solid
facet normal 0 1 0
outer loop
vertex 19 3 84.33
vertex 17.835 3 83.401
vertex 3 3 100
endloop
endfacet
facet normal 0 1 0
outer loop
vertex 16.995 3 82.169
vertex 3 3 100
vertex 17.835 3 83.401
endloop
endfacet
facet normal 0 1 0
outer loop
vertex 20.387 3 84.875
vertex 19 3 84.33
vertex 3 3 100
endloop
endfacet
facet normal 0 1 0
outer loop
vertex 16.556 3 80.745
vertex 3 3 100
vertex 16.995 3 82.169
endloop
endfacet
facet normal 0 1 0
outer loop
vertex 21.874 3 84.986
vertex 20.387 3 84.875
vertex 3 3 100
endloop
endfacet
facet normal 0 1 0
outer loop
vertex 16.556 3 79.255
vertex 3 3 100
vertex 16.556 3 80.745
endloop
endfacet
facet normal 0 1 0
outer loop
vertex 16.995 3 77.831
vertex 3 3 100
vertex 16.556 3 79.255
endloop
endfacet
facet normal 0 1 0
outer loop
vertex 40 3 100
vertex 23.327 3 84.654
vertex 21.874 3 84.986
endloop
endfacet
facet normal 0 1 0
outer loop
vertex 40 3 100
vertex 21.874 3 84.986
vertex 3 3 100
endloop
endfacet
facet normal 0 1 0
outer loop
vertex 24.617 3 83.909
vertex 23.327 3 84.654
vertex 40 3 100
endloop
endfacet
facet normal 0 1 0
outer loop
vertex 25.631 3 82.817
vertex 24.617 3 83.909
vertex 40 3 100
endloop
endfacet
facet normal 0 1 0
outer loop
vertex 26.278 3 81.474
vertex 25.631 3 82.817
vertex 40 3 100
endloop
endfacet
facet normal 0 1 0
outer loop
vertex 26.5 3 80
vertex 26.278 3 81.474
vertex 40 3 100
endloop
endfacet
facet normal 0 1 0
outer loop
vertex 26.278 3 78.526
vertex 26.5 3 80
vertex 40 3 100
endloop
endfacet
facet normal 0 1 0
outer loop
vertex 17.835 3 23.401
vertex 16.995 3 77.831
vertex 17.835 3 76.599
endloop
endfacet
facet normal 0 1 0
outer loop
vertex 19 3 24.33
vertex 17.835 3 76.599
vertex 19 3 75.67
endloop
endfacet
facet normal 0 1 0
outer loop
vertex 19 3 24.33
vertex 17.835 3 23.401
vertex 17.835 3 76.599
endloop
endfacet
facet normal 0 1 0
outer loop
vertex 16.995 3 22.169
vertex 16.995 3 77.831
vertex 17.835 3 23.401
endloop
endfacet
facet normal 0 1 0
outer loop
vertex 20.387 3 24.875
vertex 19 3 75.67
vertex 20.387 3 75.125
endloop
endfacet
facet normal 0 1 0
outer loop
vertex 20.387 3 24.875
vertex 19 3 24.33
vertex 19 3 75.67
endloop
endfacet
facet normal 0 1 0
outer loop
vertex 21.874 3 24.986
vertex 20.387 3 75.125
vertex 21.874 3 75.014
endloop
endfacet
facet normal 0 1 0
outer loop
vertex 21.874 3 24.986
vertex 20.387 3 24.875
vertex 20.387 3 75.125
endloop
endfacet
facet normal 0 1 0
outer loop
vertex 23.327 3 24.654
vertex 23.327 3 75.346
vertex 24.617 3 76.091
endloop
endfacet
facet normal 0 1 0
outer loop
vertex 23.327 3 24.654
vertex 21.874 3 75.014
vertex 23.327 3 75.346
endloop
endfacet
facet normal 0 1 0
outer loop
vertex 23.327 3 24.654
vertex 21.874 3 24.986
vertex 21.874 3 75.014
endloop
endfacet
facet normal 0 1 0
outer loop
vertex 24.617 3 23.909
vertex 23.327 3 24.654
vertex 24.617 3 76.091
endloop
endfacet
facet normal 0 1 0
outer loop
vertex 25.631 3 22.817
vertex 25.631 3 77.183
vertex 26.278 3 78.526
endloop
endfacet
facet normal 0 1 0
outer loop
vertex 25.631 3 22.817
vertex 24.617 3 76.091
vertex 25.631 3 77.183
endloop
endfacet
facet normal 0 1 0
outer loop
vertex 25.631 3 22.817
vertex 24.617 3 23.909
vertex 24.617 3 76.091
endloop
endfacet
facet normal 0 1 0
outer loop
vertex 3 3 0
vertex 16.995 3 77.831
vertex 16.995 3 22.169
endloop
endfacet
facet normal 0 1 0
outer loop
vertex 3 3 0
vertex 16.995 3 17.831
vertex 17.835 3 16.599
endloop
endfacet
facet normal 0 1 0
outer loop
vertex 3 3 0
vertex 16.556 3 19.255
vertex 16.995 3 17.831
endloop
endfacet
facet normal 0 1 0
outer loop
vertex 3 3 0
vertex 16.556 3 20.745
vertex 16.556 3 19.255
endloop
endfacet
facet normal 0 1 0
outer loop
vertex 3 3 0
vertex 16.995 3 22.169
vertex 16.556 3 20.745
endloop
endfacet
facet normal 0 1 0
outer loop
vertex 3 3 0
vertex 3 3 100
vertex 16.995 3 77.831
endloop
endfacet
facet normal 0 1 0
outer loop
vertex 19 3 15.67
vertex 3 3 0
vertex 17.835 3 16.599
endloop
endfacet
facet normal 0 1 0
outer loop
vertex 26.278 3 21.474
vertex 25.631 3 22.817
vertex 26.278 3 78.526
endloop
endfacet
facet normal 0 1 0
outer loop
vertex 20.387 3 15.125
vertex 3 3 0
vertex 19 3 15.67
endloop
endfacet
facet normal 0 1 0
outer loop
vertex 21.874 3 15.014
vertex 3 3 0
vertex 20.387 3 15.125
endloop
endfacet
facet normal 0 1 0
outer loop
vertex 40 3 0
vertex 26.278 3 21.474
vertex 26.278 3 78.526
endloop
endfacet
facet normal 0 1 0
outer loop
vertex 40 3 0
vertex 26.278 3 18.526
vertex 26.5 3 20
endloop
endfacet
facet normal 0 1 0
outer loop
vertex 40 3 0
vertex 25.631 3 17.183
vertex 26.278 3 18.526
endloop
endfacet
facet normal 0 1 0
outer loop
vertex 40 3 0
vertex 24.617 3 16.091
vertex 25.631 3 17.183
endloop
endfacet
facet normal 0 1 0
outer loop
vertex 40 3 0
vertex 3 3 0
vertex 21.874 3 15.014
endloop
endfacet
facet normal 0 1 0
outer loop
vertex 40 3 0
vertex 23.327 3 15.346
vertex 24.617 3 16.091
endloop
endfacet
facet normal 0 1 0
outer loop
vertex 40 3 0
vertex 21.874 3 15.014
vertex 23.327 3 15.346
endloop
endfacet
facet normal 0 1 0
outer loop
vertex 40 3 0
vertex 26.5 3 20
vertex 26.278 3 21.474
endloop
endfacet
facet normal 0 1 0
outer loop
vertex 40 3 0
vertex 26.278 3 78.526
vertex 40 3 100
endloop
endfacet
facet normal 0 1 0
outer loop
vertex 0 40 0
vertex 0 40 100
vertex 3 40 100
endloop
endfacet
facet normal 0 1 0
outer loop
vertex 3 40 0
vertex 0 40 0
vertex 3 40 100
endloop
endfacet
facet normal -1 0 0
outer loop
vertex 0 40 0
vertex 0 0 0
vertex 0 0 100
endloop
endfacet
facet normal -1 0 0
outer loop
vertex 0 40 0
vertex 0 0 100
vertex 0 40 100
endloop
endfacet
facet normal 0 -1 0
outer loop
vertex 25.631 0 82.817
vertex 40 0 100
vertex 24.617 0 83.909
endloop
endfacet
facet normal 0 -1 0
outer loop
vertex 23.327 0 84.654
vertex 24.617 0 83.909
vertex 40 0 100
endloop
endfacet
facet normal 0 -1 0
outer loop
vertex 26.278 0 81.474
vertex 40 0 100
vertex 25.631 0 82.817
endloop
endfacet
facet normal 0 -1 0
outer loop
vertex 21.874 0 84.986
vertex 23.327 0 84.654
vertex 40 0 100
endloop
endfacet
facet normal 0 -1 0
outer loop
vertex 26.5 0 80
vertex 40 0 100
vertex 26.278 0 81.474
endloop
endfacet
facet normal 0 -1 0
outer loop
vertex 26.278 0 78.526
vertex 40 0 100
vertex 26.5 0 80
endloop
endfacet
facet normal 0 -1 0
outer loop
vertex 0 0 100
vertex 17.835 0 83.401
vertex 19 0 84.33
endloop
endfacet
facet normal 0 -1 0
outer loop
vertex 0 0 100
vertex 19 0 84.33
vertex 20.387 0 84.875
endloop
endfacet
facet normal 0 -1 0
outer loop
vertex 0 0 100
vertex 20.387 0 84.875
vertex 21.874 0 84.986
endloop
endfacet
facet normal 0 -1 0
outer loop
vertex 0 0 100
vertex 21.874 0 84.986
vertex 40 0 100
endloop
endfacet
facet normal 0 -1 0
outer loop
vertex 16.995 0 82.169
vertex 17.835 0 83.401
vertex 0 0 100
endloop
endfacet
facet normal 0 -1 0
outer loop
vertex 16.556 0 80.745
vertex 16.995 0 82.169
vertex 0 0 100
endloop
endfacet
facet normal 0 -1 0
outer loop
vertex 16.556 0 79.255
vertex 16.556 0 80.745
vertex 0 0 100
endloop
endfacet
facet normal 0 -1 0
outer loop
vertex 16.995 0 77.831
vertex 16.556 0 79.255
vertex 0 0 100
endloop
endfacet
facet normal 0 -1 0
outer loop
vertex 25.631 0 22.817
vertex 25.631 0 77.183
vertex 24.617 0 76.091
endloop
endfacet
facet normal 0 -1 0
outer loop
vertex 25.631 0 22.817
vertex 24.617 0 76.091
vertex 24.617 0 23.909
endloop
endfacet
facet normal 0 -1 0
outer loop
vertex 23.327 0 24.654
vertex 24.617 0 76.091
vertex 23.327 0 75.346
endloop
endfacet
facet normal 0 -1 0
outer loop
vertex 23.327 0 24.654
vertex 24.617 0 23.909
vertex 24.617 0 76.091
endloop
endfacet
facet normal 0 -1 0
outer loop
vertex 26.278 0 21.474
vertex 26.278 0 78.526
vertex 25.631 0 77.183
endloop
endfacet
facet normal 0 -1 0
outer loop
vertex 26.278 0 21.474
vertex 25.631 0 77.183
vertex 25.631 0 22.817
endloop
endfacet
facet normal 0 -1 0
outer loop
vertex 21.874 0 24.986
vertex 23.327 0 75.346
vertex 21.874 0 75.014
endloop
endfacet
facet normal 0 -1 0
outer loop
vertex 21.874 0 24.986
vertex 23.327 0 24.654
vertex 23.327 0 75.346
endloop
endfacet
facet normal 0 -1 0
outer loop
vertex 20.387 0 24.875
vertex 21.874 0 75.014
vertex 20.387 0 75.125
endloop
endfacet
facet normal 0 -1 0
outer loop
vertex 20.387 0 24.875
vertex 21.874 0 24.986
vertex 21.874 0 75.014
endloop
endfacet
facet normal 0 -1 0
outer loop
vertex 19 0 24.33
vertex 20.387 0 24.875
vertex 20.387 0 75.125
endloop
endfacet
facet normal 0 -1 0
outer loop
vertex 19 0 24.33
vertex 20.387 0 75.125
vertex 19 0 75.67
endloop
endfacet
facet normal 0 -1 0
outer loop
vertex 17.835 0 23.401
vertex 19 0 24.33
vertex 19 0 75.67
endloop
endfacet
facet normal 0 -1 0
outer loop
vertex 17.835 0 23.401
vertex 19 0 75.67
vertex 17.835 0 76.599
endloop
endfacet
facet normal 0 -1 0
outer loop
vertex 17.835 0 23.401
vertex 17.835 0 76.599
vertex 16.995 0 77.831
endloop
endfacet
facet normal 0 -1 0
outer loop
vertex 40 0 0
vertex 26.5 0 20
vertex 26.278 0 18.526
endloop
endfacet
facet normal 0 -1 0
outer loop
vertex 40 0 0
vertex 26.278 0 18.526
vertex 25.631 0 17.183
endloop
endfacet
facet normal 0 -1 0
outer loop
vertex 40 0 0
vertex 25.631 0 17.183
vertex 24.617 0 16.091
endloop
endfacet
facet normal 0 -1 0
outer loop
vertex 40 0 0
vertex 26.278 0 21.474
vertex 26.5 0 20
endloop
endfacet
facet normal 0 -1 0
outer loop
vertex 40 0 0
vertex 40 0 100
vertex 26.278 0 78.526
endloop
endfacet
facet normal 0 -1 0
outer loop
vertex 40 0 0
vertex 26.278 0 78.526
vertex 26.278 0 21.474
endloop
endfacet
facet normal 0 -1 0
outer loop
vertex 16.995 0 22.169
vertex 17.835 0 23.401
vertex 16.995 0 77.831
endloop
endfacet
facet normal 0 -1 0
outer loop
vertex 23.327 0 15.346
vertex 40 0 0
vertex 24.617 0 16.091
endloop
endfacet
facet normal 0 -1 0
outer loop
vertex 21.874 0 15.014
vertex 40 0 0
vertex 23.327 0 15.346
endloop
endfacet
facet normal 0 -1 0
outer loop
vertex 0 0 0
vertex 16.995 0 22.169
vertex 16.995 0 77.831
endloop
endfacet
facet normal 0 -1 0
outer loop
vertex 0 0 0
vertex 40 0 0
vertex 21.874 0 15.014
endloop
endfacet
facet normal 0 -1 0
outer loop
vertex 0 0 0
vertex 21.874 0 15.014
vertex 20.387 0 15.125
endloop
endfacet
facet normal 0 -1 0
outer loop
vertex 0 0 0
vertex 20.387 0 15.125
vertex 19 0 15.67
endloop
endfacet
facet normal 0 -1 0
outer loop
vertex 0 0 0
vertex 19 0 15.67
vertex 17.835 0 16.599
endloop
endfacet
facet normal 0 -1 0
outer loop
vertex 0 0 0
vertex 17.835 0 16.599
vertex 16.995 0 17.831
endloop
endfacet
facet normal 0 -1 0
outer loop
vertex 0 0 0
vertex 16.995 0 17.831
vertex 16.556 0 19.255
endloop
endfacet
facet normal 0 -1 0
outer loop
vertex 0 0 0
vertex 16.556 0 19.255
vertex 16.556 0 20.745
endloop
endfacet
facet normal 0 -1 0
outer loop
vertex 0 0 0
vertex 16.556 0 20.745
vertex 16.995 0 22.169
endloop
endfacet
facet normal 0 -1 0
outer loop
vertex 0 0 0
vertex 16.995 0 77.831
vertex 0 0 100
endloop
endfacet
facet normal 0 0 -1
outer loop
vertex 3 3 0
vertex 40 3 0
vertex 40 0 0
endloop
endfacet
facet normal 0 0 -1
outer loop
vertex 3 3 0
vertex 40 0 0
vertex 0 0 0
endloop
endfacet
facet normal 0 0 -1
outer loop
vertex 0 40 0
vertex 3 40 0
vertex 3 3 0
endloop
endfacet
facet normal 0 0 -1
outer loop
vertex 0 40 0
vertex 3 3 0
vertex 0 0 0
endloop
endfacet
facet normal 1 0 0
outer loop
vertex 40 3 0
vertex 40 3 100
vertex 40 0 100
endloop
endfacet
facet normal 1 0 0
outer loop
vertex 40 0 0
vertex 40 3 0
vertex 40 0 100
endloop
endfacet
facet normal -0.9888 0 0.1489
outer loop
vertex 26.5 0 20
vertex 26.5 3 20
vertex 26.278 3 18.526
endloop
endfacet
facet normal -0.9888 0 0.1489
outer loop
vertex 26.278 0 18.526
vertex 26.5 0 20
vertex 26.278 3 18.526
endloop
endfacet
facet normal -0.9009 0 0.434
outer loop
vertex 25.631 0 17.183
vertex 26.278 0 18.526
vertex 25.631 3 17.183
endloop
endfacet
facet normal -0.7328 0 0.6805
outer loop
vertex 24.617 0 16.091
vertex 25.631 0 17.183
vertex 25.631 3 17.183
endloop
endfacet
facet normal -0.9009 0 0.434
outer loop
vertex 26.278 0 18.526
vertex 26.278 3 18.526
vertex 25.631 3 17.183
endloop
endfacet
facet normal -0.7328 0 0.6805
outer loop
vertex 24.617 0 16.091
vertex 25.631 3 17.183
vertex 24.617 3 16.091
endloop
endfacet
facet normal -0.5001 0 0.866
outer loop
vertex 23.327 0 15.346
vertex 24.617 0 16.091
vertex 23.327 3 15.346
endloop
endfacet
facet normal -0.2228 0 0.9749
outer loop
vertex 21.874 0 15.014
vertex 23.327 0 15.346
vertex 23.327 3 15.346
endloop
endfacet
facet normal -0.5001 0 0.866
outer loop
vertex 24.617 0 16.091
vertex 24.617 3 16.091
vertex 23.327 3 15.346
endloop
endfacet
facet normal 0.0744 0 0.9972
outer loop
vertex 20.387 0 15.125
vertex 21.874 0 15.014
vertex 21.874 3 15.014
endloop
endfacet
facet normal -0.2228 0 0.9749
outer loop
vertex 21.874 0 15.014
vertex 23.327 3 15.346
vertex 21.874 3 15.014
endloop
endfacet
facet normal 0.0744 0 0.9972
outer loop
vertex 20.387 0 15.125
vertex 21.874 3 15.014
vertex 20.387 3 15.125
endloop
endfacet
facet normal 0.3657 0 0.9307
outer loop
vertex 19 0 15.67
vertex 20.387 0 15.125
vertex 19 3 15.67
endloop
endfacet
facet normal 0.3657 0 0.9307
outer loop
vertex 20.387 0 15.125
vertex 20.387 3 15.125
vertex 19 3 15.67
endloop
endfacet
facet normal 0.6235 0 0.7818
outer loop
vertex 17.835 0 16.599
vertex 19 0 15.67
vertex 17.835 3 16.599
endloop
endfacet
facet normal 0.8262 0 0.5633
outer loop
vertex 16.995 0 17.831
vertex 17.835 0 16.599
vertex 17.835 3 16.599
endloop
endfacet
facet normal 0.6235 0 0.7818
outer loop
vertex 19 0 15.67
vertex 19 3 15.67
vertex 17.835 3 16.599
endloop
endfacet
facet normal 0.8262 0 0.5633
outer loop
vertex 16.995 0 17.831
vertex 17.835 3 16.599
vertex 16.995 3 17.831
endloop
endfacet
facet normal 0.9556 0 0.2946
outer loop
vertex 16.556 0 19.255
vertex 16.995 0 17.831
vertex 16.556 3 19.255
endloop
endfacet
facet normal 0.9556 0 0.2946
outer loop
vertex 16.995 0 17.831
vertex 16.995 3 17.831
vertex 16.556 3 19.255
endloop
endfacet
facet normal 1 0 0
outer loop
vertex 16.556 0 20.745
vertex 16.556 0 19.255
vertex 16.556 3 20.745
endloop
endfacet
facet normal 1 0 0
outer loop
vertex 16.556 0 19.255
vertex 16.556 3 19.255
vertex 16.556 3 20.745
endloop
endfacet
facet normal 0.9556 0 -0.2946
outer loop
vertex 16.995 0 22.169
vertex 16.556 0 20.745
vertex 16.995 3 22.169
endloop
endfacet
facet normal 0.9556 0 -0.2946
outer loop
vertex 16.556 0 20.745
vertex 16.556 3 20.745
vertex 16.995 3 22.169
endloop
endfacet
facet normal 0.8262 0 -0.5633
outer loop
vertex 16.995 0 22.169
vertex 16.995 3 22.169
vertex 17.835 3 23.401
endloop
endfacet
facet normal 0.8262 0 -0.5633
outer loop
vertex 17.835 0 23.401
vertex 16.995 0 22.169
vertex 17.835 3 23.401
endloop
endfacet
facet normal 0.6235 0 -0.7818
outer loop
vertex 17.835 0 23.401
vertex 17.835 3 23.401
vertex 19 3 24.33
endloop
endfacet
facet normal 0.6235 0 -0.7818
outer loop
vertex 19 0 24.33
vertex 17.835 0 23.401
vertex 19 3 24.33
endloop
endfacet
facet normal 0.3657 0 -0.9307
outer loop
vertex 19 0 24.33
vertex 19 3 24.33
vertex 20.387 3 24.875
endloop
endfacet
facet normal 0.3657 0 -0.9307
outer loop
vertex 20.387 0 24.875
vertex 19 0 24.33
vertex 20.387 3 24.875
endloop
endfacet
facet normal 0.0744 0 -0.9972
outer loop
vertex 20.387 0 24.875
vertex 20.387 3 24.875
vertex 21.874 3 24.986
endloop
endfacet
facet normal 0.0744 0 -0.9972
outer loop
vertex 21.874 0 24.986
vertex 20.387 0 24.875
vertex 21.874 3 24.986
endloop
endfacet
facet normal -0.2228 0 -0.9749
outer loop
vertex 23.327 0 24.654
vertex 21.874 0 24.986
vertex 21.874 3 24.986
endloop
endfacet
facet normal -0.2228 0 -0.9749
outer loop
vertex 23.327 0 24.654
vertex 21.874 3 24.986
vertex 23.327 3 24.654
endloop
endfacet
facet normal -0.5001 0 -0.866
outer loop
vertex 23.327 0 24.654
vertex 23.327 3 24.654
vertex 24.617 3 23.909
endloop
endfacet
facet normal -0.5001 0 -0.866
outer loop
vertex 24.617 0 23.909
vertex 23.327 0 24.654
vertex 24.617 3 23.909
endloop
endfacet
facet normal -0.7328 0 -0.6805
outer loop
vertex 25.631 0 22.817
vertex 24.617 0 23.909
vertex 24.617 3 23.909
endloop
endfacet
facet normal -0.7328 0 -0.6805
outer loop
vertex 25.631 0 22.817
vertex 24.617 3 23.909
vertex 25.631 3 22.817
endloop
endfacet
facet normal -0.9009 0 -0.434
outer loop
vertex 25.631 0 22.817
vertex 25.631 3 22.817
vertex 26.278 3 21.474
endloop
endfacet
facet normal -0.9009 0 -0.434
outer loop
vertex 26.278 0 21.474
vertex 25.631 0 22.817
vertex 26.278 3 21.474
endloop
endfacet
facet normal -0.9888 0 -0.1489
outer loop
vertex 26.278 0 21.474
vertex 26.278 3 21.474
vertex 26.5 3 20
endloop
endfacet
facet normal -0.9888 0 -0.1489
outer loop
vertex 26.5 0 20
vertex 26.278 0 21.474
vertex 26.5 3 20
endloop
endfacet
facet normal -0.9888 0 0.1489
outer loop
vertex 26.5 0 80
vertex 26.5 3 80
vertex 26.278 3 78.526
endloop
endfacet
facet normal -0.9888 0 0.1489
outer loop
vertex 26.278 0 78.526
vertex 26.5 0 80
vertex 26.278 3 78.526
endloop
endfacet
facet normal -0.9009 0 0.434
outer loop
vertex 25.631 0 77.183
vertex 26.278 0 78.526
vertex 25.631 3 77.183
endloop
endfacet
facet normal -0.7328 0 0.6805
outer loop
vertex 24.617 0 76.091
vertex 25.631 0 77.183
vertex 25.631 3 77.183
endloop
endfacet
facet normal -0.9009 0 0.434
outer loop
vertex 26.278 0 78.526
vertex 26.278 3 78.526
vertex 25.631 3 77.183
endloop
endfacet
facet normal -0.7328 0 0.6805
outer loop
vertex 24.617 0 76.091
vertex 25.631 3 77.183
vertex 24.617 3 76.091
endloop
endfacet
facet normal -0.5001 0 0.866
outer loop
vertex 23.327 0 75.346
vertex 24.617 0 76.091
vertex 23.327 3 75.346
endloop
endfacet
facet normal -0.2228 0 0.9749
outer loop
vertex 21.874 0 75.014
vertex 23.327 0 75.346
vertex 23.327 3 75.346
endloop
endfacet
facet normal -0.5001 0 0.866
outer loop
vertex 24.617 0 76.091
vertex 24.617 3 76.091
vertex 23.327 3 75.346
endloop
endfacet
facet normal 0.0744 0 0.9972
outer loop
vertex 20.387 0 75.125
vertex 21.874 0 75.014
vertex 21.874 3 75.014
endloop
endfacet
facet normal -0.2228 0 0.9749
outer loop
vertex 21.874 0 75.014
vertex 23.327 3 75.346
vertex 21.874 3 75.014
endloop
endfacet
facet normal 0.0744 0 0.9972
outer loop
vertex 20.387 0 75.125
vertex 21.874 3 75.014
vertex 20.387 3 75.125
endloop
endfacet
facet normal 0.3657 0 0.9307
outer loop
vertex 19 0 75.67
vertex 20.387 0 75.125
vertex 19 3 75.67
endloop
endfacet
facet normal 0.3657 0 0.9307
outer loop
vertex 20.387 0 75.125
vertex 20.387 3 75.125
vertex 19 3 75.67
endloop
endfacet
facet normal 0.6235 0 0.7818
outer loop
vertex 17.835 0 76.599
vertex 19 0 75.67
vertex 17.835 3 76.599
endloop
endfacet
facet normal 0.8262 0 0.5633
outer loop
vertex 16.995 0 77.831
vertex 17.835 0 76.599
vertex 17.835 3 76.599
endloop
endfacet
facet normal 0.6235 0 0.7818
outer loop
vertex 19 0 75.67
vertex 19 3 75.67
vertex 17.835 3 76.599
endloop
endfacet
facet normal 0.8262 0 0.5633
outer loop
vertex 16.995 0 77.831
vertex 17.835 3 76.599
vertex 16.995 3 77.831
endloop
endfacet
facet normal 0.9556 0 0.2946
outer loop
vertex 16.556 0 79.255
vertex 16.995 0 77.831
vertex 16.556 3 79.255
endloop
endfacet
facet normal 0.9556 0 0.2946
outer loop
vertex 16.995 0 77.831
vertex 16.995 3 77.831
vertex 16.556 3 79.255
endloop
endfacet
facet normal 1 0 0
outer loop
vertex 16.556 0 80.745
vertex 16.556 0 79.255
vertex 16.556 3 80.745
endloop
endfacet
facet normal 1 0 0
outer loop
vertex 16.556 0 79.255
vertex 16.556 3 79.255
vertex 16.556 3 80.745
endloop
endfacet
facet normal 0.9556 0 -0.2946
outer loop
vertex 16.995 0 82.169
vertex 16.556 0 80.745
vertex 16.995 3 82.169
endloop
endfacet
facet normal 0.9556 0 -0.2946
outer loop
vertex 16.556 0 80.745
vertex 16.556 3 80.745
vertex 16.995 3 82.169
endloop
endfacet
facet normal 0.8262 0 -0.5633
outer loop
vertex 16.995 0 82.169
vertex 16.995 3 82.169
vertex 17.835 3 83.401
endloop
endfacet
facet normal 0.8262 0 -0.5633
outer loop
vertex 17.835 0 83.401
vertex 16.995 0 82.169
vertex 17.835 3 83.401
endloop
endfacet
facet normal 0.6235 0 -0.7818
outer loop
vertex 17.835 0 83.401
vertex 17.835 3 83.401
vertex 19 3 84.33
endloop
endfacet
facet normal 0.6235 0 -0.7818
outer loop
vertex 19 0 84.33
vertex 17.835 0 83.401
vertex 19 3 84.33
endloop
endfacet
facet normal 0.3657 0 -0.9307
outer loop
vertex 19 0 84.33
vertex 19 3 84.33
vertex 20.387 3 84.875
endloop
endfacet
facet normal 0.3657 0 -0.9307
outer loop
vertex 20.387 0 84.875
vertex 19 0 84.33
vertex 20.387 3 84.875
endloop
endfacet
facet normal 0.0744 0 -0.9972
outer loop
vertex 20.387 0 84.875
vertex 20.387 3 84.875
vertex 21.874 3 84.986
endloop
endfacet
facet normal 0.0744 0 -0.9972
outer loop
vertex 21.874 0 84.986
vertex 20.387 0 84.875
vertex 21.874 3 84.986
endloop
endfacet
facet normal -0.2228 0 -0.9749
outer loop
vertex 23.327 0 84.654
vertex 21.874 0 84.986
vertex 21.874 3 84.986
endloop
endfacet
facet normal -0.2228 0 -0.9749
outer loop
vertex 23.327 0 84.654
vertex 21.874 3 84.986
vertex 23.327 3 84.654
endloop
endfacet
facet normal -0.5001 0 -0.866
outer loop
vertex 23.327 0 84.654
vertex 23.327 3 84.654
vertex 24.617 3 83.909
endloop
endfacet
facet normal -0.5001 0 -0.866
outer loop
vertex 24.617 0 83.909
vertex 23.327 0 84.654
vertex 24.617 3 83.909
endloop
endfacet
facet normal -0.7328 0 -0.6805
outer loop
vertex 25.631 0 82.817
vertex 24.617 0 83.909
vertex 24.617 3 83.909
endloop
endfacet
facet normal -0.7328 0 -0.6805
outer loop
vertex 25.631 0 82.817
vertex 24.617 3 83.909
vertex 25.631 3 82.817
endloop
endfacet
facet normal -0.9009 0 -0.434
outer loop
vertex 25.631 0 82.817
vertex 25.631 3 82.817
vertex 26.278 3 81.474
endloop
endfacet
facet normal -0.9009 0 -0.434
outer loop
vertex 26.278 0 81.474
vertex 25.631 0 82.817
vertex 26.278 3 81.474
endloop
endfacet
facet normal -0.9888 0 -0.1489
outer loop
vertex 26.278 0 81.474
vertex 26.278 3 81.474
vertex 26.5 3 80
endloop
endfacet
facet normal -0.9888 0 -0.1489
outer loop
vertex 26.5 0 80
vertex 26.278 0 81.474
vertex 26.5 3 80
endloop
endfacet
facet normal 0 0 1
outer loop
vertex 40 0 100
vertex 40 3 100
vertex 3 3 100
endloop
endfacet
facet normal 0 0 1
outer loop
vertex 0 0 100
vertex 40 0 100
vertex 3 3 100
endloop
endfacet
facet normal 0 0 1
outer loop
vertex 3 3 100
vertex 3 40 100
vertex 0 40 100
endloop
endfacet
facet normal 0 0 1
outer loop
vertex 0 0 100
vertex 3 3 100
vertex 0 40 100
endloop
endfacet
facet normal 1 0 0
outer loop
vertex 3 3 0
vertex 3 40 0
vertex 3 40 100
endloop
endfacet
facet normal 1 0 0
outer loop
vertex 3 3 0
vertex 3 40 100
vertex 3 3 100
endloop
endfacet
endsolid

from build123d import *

# Parameters (mm, degrees)
EXTRUDE_1_DEPTH     = 100
CUT_EXTRUDE_1_REACH = 5
SKETCH_2_R          = 5


with BuildPart() as part:
    # Эскиз1 → Бобышка-Вытянуть1 (new body)
    with BuildSketch(Plane.XY):
        Polygon((0, 0), (0, 40), (3, 40), (3, 3), (40, 3), (40, 0), align=None)
    extrude(amount=EXTRUDE_1_DEPTH)

    # Эскиз2 → Вырез-Вытянуть1 (cut, up to next)
    with BuildSketch(Plane(origin=(0, 3, 0), x_dir=(1, 0, 0), z_dir=(0, 1, 0)), mode=Mode.PRIVATE) as cut_extrude_1_sk1:
        with Locations((21.5, -20)):
            Circle(SKETCH_2_R)
    cut_extrude_1_tool1 = extrude(cut_extrude_1_sk1.sketch, amount=-CUT_EXTRUDE_1_REACH, mode=Mode.PRIVATE) & part.part
    add(cut_extrude_1_tool1.solids().sort_by_distance((21.5, 3, 20))[0], mode=Mode.SUBTRACT)
    # Эскиз2 → Вырез-Вытянуть1 (cut, up to next)
    with BuildSketch(Plane(origin=(0, 3, 0), x_dir=(1, 0, 0), z_dir=(0, 1, 0)), mode=Mode.PRIVATE) as cut_extrude_1_sk2:
        with Locations((21.5, -80)):
            Circle(SKETCH_2_R)
    cut_extrude_1_tool2 = extrude(cut_extrude_1_sk2.sketch, amount=-CUT_EXTRUDE_1_REACH, mode=Mode.PRIVATE) & part.part
    add(cut_extrude_1_tool2.solids().sort_by_distance((21.5, 3, 80))[0], mode=Mode.SUBTRACT)


solid = part.part
